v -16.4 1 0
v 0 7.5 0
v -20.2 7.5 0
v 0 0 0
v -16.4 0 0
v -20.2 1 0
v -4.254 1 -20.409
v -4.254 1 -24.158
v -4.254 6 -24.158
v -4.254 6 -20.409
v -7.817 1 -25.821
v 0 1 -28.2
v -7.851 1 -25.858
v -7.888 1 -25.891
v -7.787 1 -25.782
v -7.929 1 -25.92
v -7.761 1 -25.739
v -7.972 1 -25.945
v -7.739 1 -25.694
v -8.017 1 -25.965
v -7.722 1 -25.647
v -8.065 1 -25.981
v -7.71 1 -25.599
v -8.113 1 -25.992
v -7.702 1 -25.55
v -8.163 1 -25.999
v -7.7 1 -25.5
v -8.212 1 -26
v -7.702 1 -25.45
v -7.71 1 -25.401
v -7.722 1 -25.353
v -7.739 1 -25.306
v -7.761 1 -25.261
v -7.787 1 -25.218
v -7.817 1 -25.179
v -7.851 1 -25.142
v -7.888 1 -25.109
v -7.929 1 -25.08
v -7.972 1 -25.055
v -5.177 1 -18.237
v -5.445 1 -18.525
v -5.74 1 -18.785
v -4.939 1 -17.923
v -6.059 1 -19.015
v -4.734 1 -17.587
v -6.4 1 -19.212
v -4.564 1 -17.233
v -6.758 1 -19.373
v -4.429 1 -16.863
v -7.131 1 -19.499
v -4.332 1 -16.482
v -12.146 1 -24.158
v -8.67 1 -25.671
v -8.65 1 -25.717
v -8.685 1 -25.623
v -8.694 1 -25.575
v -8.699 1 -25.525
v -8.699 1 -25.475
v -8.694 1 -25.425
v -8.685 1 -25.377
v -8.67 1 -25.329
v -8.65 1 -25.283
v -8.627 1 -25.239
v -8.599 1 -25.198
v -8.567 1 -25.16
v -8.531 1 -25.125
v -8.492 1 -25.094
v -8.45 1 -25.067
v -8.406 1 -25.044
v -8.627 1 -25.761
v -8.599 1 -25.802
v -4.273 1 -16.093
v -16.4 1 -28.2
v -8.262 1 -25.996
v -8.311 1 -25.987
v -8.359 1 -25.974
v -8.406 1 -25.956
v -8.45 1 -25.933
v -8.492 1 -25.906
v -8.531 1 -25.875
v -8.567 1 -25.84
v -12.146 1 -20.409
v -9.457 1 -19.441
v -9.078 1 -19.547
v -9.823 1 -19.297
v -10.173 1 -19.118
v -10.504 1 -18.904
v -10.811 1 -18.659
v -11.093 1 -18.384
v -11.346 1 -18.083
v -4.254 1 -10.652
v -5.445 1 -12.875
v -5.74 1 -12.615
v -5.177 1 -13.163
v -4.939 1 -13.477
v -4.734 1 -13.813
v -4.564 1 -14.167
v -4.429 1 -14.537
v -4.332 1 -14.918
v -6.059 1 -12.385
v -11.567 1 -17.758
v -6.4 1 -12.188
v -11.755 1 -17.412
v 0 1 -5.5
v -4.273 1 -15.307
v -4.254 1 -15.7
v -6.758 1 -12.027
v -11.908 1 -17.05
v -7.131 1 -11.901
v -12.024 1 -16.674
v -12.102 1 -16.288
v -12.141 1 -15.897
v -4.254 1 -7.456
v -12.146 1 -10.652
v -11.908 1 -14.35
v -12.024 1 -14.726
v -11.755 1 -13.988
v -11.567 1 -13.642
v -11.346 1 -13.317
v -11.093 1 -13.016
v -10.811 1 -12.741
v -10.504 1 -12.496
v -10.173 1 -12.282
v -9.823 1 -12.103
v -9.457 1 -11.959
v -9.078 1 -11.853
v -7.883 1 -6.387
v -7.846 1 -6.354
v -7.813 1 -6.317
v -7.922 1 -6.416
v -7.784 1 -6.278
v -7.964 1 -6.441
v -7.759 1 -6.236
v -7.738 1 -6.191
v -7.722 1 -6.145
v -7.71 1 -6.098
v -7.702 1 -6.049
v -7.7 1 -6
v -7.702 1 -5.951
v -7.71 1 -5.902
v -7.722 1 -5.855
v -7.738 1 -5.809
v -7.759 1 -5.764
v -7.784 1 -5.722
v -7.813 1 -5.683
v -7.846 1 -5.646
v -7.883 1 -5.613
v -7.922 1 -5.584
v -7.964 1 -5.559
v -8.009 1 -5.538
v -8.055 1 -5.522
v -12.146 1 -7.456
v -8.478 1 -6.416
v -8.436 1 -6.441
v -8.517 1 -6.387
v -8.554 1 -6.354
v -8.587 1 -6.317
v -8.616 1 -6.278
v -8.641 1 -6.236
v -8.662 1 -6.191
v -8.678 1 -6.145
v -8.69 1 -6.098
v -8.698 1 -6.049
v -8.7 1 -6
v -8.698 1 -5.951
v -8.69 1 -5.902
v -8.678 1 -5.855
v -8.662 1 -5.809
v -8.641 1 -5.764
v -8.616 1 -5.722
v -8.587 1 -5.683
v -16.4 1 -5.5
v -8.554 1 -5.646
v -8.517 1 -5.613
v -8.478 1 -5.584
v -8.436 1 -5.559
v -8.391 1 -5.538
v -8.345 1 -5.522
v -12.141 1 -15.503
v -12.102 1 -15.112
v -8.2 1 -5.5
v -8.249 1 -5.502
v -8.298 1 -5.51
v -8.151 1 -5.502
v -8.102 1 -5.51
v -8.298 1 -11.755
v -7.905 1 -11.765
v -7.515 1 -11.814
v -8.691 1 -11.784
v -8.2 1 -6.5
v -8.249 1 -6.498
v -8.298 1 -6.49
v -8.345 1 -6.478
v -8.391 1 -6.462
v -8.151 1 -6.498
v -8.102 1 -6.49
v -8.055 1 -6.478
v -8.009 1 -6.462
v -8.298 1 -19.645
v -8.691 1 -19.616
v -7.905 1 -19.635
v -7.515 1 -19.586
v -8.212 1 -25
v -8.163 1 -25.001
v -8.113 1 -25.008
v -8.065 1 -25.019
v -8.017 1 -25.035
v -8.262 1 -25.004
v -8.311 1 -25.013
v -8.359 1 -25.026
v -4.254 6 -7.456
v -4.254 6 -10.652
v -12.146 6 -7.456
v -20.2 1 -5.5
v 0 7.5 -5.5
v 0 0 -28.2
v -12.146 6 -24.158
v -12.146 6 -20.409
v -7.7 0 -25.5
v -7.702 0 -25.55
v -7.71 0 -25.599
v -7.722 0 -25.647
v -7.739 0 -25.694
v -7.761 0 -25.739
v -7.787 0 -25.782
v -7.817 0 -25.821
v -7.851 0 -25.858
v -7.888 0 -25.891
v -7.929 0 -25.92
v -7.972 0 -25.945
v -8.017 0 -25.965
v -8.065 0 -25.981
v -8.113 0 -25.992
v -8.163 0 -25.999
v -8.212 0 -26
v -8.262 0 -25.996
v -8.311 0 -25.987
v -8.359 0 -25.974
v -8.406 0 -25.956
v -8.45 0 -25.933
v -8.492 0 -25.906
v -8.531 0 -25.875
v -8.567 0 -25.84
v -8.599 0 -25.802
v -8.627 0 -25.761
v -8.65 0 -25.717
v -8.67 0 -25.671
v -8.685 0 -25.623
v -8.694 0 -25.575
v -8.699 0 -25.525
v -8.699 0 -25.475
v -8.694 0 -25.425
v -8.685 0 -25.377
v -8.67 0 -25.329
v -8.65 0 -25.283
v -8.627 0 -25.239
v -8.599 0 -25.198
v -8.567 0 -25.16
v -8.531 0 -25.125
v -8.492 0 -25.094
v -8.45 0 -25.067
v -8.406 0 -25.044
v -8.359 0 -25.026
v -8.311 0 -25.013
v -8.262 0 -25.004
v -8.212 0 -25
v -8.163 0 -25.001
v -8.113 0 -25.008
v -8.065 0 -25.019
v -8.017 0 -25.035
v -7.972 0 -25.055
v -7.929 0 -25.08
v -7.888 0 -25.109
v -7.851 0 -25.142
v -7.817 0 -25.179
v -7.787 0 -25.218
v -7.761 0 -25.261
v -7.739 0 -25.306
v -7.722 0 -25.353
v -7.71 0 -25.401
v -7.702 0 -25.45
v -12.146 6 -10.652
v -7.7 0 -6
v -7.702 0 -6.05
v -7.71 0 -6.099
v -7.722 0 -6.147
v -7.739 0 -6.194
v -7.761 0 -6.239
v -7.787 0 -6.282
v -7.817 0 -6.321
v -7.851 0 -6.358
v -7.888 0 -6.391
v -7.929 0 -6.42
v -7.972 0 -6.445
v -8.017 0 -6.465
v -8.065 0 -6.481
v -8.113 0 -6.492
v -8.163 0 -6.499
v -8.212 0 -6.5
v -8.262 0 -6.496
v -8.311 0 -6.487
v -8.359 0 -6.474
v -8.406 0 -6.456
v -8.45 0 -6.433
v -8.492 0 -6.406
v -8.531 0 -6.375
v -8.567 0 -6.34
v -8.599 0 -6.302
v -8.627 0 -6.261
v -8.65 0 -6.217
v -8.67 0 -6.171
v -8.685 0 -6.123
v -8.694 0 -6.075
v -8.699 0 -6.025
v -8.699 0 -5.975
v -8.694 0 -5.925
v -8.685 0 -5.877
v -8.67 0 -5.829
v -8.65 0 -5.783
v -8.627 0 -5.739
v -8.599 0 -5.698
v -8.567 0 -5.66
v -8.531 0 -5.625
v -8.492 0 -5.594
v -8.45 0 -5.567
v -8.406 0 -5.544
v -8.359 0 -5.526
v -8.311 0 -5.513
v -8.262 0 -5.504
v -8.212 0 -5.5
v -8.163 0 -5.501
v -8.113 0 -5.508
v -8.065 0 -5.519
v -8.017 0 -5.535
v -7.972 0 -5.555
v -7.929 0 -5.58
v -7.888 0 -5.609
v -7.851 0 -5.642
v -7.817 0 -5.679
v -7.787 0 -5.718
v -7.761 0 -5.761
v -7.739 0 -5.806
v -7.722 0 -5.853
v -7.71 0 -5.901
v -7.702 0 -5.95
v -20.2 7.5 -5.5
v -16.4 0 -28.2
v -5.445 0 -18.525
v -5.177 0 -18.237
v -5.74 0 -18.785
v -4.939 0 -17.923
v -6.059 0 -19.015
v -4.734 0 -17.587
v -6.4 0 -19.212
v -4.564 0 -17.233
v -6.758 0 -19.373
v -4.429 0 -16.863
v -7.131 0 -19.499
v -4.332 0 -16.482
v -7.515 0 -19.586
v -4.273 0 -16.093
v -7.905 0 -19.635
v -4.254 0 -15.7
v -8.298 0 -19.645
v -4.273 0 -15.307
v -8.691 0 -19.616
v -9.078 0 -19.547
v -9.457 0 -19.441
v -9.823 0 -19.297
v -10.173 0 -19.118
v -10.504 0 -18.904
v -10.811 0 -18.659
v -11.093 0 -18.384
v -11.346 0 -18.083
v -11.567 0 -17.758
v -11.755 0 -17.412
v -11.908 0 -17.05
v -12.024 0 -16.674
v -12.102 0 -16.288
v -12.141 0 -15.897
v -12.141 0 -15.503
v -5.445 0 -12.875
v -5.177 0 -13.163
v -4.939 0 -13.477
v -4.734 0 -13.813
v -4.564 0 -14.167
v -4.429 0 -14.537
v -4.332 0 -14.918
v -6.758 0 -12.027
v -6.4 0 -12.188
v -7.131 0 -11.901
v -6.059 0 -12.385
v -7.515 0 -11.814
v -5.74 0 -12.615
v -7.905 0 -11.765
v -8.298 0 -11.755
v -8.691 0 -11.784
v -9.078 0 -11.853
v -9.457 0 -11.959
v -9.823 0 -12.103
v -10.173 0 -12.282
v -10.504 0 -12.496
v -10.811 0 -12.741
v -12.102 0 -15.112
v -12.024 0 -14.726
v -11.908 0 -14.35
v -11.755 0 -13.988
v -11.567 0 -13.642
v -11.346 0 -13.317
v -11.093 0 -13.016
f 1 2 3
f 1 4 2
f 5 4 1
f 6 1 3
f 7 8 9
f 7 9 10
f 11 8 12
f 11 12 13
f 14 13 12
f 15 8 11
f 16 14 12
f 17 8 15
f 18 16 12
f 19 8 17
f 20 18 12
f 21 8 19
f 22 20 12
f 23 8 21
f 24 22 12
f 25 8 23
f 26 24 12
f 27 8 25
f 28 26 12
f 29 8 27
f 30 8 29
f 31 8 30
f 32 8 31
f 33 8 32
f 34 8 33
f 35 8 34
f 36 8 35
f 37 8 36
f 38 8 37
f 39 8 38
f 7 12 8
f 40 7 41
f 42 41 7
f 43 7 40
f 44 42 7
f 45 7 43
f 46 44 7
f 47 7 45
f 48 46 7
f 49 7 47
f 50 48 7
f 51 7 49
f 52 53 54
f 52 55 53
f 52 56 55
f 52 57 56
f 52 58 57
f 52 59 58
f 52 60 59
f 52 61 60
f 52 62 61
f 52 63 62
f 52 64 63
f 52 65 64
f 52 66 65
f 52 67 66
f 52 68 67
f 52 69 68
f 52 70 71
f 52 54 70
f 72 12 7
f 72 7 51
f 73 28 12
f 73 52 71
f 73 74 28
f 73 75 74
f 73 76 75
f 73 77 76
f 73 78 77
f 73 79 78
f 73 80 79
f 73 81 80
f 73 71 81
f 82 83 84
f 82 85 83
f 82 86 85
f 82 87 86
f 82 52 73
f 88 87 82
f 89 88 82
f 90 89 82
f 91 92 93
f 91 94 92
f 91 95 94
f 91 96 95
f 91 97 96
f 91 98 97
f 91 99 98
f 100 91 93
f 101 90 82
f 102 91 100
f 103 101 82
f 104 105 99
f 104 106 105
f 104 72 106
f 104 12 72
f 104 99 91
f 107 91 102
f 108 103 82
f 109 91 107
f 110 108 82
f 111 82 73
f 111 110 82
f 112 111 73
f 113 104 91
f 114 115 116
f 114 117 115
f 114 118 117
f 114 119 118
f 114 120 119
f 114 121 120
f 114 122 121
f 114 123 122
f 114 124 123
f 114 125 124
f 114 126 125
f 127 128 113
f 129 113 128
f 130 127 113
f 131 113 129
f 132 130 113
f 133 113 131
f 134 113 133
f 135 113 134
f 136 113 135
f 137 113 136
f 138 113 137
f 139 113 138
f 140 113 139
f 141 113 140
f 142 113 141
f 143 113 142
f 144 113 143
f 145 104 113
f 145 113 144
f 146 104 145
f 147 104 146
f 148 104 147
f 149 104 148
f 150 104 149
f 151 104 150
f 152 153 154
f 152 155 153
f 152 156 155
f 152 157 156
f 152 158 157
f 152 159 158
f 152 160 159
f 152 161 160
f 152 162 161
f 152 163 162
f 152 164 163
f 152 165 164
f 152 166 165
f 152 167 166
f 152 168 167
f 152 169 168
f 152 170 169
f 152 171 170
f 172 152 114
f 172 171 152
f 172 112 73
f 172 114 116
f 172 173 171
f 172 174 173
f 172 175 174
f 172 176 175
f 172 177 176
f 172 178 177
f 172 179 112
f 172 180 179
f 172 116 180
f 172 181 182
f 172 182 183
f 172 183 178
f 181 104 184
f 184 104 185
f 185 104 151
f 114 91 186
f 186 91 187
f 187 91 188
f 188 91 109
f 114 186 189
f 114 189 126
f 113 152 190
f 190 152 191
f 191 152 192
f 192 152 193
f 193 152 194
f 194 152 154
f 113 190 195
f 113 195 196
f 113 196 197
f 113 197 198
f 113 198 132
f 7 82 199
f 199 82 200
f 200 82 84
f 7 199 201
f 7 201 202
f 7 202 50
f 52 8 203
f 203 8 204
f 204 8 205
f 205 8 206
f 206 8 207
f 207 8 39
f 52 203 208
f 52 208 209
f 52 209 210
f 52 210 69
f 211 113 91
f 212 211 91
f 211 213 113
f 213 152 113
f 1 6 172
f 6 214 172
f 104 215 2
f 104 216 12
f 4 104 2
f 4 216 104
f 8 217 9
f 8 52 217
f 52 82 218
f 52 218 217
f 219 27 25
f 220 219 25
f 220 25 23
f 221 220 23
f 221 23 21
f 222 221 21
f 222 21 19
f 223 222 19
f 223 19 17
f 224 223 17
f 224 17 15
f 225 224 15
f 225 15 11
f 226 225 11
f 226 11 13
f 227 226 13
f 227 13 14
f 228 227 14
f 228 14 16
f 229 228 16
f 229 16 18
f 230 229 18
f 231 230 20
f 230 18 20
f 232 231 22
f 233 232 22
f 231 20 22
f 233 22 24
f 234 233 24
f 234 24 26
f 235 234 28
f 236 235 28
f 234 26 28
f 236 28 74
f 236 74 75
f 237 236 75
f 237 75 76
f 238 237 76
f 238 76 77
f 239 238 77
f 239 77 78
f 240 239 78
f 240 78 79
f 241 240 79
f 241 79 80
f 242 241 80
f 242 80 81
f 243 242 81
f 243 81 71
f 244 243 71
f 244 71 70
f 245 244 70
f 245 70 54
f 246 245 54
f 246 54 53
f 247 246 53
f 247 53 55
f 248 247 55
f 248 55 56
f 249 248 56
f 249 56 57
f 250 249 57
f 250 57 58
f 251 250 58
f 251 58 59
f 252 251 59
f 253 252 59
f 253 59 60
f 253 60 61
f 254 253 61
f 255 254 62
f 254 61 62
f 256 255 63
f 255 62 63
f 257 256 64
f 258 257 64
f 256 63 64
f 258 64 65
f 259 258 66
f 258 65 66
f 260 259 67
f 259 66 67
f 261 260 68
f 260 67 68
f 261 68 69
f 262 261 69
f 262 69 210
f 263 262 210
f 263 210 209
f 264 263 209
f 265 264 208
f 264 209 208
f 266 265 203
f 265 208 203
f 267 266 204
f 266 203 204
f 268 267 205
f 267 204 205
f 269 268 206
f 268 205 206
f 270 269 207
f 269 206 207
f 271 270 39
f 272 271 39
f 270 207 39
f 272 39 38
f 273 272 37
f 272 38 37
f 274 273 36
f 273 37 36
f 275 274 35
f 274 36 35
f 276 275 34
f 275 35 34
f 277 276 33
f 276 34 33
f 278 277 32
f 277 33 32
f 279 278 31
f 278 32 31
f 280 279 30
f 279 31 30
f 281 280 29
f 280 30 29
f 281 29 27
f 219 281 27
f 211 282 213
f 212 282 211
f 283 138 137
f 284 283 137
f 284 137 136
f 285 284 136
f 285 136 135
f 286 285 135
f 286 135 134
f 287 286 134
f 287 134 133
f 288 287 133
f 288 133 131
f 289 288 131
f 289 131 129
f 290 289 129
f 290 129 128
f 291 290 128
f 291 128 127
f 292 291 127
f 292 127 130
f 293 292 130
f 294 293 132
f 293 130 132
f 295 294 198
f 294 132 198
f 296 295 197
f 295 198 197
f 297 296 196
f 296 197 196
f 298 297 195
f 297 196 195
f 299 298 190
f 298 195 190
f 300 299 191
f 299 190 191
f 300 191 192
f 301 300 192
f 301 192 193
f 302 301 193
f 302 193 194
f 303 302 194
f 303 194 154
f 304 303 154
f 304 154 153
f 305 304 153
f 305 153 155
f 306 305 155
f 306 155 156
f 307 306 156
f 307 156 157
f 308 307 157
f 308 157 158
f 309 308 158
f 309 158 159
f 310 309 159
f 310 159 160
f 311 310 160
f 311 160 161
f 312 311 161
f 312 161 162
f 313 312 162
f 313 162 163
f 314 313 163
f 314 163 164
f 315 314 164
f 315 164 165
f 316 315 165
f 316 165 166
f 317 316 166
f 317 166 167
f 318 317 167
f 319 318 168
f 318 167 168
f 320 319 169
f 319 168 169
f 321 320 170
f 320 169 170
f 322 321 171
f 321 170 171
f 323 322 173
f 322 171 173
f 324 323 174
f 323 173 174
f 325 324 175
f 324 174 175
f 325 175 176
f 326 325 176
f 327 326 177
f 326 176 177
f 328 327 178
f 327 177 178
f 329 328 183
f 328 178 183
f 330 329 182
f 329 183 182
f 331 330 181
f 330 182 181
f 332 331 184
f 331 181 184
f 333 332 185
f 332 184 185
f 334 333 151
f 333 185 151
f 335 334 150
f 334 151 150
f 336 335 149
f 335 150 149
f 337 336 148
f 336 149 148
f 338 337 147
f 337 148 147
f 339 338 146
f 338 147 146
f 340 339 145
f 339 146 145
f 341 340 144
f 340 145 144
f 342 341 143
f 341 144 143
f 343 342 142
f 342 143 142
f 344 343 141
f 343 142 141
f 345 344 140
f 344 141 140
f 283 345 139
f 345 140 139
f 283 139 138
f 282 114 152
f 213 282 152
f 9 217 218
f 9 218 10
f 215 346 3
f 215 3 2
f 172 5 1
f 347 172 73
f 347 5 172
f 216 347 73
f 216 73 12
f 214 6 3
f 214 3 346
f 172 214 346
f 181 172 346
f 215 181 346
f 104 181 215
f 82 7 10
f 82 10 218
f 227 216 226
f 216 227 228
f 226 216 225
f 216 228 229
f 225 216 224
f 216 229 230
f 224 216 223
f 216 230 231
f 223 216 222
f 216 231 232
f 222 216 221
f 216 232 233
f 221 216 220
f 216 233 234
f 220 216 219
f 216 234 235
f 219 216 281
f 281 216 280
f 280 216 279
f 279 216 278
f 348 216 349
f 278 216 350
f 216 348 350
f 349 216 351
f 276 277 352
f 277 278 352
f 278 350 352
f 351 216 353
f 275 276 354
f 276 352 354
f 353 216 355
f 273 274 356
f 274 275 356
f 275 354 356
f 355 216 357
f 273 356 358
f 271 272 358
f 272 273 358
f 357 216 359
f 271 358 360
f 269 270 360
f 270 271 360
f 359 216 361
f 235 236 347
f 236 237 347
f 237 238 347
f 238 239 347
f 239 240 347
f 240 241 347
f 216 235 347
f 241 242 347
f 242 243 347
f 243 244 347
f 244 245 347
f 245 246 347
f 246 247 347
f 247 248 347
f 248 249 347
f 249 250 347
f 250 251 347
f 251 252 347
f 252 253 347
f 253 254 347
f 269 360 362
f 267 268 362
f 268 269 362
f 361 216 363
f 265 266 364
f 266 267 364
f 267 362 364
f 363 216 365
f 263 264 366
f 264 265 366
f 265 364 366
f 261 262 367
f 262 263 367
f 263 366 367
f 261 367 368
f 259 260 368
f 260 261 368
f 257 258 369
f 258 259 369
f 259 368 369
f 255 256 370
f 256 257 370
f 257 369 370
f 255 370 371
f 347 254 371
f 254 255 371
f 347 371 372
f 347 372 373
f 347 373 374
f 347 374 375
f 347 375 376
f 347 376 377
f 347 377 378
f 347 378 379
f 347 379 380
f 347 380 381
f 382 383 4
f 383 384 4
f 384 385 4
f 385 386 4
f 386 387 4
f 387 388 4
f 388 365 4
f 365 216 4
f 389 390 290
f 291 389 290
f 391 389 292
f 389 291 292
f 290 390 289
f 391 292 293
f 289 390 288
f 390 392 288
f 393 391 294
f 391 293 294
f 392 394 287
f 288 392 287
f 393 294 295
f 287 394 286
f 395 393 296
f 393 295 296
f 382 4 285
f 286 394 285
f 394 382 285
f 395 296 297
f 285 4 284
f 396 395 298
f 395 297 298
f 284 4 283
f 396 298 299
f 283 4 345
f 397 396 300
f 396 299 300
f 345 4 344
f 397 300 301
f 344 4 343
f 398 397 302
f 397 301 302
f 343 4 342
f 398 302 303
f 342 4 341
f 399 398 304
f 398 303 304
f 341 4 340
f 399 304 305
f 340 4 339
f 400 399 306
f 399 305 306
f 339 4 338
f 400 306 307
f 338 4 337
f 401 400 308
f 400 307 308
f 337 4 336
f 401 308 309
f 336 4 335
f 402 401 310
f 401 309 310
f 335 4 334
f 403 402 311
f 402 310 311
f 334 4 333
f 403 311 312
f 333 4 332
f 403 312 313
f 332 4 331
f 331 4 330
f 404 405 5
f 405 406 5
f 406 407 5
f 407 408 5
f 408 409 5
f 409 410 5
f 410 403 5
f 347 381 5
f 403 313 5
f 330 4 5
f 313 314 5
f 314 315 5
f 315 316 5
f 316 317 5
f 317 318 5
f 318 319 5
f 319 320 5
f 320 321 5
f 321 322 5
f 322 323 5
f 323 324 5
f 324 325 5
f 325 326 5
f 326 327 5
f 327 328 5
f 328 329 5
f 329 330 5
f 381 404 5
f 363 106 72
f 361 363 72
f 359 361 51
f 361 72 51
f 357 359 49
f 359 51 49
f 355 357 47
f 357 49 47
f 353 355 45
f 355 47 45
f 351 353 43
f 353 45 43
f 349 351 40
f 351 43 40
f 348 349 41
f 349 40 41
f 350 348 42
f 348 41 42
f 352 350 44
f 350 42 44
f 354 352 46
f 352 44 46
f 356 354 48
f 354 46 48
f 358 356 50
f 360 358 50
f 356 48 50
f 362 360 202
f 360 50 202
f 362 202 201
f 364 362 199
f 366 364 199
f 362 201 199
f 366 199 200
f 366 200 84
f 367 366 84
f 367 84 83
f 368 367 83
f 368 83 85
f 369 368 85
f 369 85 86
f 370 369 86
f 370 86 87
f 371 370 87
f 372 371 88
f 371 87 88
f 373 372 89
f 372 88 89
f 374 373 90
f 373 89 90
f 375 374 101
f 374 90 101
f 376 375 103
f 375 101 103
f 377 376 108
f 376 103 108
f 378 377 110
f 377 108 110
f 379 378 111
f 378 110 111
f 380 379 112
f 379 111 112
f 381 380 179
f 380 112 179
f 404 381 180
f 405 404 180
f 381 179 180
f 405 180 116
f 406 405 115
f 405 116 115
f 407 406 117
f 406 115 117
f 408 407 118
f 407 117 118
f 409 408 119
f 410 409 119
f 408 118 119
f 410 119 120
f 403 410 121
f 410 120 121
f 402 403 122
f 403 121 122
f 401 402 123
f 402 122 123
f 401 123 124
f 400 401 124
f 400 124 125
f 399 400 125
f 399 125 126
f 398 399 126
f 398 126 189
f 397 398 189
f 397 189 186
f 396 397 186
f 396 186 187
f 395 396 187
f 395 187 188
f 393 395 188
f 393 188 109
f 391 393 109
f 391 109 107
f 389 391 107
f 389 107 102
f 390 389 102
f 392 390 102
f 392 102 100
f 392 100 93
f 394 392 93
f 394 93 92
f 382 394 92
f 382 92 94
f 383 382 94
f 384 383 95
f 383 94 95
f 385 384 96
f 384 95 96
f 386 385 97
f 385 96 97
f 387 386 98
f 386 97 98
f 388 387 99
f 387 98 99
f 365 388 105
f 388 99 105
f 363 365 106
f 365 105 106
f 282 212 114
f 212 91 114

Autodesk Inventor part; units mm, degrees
ref_plane "YZ Plane" through (0, 0, 0) normal (1, 0, 0) x (0, 1, 0)
ref_plane "XZ Plane" through (0, 0, 0) normal (0, 1, 0) x (-1, 0, 0)
ref_plane "XY Plane" through (0, 0, 0) normal (0, 0, 1) x (1, 0, 0)
sketch "Sketch1" plane through (0, 0, 0) normal (0, 1, 0) x (-1, 0, 0)
  line L0 (0, 0) -> (16.4, 0)
  line L1 (16.4, 0) -> (16.4, -28.2)
  line L2 (16.4, -28.2) -> (0, -28.2)
  line L3 (0, -28.2) -> (0, 0)
  dimension "d0" = 16.4
  dimension "d1" = 28.2
extrude "Extrusion1" add sketch "Sketch1" along normal blind 1
sketch "Sketch2" plane through (0, 1, 0) normal (0, 1, 0) x (1, 0, 0)
  circle A0 centre (-8.2, 6) radius 0.5
  circle A1 centre (-8.2, 25.5) radius 0.5
  line L0 (-16.4, 0) -> (0, 0) projected
  line L1 (-16.4, 28.2) -> (-16.4, 0) projected
  circle A2 centre (-8.2, 15.7) radius 3.9462
  dimension "d4" = 1
  dimension "d5" = 1
  dimension "d6" = 6
  dimension "d7" = 19.5
  dimension "d8" = 8.2
  dimension "d9" = 8.2
  dimension "d10" = 9.7
  dimension "d11" = 9.8
extrude "Extrusion2" cut sketch "Sketch2" against normal blind 1
sketch "Sketch3" plane through (0, 1, 0) normal (0, 1, 0) x (1, 0, 0)
  line L0 (0, 0) -> (-20.2, 0)
  line L1 (-20.2, 0) -> (-20.2, 5.5)
  line L2 (-20.2, 5.5) -> (0, 5.5)
  line L3 (0, 5.5) -> (0, 0)
  dimension "d14" = 20.2
  dimension "d15" = 5.5
extrude "Extrusion3" add sketch "Sketch3" along normal blind 6.5
sketch "Sketch4" plane through (0, 1, 0) normal (0, 1, 0) x (1, 0, 0)
  line L0 (-8.2, 5.5) -> (0, 5.5) projected
  line L1 (0, 5.5) -> (0, 28.2) projected
  line L2 (0, 28.2) -> (-16.4, 28.2) projected
  line L3 (-16.4, 28.2) -> (-16.4, 5.5) projected
  line L4 (-16.4, 5.5) -> (-8.2, 5.5) projected
  circle A0 centre (-8.2, 6) radius 0.5 projected
  circle A1 centre (-8.2, 25.5) radius 0.5 projected
  circle A2 centre (-8.2, 15.7) radius 3.9462 projected
  line L5 (-12.1462, 7.4563) -> (-4.2538, 7.4563)
  line L6 (-4.2538, 7.4563) -> (-4.2538, 10.6519)
  line L7 (-4.2538, 10.6519) -> (-12.1462, 10.6519)
  line L8 (-12.1462, 10.6519) -> (-12.1462, 7.4563)
  line L9 (-12.1462, 24.1585) -> (-4.2538, 24.1585)
  line L10 (-4.2538, 24.1585) -> (-4.2538, 20.409)
  line L11 (-4.2538, 20.409) -> (-12.1462, 20.409)
  line L12 (-12.1462, 20.409) -> (-12.1462, 24.1585)
  point P0 (0, 0)
extrude "Extrusion4" add sketch "Sketch4" along normal blind 5 contours L8 L7 L6 L5 | L9 L10 L11 L12
properties part number "LG_CRD_8521B_Base"
